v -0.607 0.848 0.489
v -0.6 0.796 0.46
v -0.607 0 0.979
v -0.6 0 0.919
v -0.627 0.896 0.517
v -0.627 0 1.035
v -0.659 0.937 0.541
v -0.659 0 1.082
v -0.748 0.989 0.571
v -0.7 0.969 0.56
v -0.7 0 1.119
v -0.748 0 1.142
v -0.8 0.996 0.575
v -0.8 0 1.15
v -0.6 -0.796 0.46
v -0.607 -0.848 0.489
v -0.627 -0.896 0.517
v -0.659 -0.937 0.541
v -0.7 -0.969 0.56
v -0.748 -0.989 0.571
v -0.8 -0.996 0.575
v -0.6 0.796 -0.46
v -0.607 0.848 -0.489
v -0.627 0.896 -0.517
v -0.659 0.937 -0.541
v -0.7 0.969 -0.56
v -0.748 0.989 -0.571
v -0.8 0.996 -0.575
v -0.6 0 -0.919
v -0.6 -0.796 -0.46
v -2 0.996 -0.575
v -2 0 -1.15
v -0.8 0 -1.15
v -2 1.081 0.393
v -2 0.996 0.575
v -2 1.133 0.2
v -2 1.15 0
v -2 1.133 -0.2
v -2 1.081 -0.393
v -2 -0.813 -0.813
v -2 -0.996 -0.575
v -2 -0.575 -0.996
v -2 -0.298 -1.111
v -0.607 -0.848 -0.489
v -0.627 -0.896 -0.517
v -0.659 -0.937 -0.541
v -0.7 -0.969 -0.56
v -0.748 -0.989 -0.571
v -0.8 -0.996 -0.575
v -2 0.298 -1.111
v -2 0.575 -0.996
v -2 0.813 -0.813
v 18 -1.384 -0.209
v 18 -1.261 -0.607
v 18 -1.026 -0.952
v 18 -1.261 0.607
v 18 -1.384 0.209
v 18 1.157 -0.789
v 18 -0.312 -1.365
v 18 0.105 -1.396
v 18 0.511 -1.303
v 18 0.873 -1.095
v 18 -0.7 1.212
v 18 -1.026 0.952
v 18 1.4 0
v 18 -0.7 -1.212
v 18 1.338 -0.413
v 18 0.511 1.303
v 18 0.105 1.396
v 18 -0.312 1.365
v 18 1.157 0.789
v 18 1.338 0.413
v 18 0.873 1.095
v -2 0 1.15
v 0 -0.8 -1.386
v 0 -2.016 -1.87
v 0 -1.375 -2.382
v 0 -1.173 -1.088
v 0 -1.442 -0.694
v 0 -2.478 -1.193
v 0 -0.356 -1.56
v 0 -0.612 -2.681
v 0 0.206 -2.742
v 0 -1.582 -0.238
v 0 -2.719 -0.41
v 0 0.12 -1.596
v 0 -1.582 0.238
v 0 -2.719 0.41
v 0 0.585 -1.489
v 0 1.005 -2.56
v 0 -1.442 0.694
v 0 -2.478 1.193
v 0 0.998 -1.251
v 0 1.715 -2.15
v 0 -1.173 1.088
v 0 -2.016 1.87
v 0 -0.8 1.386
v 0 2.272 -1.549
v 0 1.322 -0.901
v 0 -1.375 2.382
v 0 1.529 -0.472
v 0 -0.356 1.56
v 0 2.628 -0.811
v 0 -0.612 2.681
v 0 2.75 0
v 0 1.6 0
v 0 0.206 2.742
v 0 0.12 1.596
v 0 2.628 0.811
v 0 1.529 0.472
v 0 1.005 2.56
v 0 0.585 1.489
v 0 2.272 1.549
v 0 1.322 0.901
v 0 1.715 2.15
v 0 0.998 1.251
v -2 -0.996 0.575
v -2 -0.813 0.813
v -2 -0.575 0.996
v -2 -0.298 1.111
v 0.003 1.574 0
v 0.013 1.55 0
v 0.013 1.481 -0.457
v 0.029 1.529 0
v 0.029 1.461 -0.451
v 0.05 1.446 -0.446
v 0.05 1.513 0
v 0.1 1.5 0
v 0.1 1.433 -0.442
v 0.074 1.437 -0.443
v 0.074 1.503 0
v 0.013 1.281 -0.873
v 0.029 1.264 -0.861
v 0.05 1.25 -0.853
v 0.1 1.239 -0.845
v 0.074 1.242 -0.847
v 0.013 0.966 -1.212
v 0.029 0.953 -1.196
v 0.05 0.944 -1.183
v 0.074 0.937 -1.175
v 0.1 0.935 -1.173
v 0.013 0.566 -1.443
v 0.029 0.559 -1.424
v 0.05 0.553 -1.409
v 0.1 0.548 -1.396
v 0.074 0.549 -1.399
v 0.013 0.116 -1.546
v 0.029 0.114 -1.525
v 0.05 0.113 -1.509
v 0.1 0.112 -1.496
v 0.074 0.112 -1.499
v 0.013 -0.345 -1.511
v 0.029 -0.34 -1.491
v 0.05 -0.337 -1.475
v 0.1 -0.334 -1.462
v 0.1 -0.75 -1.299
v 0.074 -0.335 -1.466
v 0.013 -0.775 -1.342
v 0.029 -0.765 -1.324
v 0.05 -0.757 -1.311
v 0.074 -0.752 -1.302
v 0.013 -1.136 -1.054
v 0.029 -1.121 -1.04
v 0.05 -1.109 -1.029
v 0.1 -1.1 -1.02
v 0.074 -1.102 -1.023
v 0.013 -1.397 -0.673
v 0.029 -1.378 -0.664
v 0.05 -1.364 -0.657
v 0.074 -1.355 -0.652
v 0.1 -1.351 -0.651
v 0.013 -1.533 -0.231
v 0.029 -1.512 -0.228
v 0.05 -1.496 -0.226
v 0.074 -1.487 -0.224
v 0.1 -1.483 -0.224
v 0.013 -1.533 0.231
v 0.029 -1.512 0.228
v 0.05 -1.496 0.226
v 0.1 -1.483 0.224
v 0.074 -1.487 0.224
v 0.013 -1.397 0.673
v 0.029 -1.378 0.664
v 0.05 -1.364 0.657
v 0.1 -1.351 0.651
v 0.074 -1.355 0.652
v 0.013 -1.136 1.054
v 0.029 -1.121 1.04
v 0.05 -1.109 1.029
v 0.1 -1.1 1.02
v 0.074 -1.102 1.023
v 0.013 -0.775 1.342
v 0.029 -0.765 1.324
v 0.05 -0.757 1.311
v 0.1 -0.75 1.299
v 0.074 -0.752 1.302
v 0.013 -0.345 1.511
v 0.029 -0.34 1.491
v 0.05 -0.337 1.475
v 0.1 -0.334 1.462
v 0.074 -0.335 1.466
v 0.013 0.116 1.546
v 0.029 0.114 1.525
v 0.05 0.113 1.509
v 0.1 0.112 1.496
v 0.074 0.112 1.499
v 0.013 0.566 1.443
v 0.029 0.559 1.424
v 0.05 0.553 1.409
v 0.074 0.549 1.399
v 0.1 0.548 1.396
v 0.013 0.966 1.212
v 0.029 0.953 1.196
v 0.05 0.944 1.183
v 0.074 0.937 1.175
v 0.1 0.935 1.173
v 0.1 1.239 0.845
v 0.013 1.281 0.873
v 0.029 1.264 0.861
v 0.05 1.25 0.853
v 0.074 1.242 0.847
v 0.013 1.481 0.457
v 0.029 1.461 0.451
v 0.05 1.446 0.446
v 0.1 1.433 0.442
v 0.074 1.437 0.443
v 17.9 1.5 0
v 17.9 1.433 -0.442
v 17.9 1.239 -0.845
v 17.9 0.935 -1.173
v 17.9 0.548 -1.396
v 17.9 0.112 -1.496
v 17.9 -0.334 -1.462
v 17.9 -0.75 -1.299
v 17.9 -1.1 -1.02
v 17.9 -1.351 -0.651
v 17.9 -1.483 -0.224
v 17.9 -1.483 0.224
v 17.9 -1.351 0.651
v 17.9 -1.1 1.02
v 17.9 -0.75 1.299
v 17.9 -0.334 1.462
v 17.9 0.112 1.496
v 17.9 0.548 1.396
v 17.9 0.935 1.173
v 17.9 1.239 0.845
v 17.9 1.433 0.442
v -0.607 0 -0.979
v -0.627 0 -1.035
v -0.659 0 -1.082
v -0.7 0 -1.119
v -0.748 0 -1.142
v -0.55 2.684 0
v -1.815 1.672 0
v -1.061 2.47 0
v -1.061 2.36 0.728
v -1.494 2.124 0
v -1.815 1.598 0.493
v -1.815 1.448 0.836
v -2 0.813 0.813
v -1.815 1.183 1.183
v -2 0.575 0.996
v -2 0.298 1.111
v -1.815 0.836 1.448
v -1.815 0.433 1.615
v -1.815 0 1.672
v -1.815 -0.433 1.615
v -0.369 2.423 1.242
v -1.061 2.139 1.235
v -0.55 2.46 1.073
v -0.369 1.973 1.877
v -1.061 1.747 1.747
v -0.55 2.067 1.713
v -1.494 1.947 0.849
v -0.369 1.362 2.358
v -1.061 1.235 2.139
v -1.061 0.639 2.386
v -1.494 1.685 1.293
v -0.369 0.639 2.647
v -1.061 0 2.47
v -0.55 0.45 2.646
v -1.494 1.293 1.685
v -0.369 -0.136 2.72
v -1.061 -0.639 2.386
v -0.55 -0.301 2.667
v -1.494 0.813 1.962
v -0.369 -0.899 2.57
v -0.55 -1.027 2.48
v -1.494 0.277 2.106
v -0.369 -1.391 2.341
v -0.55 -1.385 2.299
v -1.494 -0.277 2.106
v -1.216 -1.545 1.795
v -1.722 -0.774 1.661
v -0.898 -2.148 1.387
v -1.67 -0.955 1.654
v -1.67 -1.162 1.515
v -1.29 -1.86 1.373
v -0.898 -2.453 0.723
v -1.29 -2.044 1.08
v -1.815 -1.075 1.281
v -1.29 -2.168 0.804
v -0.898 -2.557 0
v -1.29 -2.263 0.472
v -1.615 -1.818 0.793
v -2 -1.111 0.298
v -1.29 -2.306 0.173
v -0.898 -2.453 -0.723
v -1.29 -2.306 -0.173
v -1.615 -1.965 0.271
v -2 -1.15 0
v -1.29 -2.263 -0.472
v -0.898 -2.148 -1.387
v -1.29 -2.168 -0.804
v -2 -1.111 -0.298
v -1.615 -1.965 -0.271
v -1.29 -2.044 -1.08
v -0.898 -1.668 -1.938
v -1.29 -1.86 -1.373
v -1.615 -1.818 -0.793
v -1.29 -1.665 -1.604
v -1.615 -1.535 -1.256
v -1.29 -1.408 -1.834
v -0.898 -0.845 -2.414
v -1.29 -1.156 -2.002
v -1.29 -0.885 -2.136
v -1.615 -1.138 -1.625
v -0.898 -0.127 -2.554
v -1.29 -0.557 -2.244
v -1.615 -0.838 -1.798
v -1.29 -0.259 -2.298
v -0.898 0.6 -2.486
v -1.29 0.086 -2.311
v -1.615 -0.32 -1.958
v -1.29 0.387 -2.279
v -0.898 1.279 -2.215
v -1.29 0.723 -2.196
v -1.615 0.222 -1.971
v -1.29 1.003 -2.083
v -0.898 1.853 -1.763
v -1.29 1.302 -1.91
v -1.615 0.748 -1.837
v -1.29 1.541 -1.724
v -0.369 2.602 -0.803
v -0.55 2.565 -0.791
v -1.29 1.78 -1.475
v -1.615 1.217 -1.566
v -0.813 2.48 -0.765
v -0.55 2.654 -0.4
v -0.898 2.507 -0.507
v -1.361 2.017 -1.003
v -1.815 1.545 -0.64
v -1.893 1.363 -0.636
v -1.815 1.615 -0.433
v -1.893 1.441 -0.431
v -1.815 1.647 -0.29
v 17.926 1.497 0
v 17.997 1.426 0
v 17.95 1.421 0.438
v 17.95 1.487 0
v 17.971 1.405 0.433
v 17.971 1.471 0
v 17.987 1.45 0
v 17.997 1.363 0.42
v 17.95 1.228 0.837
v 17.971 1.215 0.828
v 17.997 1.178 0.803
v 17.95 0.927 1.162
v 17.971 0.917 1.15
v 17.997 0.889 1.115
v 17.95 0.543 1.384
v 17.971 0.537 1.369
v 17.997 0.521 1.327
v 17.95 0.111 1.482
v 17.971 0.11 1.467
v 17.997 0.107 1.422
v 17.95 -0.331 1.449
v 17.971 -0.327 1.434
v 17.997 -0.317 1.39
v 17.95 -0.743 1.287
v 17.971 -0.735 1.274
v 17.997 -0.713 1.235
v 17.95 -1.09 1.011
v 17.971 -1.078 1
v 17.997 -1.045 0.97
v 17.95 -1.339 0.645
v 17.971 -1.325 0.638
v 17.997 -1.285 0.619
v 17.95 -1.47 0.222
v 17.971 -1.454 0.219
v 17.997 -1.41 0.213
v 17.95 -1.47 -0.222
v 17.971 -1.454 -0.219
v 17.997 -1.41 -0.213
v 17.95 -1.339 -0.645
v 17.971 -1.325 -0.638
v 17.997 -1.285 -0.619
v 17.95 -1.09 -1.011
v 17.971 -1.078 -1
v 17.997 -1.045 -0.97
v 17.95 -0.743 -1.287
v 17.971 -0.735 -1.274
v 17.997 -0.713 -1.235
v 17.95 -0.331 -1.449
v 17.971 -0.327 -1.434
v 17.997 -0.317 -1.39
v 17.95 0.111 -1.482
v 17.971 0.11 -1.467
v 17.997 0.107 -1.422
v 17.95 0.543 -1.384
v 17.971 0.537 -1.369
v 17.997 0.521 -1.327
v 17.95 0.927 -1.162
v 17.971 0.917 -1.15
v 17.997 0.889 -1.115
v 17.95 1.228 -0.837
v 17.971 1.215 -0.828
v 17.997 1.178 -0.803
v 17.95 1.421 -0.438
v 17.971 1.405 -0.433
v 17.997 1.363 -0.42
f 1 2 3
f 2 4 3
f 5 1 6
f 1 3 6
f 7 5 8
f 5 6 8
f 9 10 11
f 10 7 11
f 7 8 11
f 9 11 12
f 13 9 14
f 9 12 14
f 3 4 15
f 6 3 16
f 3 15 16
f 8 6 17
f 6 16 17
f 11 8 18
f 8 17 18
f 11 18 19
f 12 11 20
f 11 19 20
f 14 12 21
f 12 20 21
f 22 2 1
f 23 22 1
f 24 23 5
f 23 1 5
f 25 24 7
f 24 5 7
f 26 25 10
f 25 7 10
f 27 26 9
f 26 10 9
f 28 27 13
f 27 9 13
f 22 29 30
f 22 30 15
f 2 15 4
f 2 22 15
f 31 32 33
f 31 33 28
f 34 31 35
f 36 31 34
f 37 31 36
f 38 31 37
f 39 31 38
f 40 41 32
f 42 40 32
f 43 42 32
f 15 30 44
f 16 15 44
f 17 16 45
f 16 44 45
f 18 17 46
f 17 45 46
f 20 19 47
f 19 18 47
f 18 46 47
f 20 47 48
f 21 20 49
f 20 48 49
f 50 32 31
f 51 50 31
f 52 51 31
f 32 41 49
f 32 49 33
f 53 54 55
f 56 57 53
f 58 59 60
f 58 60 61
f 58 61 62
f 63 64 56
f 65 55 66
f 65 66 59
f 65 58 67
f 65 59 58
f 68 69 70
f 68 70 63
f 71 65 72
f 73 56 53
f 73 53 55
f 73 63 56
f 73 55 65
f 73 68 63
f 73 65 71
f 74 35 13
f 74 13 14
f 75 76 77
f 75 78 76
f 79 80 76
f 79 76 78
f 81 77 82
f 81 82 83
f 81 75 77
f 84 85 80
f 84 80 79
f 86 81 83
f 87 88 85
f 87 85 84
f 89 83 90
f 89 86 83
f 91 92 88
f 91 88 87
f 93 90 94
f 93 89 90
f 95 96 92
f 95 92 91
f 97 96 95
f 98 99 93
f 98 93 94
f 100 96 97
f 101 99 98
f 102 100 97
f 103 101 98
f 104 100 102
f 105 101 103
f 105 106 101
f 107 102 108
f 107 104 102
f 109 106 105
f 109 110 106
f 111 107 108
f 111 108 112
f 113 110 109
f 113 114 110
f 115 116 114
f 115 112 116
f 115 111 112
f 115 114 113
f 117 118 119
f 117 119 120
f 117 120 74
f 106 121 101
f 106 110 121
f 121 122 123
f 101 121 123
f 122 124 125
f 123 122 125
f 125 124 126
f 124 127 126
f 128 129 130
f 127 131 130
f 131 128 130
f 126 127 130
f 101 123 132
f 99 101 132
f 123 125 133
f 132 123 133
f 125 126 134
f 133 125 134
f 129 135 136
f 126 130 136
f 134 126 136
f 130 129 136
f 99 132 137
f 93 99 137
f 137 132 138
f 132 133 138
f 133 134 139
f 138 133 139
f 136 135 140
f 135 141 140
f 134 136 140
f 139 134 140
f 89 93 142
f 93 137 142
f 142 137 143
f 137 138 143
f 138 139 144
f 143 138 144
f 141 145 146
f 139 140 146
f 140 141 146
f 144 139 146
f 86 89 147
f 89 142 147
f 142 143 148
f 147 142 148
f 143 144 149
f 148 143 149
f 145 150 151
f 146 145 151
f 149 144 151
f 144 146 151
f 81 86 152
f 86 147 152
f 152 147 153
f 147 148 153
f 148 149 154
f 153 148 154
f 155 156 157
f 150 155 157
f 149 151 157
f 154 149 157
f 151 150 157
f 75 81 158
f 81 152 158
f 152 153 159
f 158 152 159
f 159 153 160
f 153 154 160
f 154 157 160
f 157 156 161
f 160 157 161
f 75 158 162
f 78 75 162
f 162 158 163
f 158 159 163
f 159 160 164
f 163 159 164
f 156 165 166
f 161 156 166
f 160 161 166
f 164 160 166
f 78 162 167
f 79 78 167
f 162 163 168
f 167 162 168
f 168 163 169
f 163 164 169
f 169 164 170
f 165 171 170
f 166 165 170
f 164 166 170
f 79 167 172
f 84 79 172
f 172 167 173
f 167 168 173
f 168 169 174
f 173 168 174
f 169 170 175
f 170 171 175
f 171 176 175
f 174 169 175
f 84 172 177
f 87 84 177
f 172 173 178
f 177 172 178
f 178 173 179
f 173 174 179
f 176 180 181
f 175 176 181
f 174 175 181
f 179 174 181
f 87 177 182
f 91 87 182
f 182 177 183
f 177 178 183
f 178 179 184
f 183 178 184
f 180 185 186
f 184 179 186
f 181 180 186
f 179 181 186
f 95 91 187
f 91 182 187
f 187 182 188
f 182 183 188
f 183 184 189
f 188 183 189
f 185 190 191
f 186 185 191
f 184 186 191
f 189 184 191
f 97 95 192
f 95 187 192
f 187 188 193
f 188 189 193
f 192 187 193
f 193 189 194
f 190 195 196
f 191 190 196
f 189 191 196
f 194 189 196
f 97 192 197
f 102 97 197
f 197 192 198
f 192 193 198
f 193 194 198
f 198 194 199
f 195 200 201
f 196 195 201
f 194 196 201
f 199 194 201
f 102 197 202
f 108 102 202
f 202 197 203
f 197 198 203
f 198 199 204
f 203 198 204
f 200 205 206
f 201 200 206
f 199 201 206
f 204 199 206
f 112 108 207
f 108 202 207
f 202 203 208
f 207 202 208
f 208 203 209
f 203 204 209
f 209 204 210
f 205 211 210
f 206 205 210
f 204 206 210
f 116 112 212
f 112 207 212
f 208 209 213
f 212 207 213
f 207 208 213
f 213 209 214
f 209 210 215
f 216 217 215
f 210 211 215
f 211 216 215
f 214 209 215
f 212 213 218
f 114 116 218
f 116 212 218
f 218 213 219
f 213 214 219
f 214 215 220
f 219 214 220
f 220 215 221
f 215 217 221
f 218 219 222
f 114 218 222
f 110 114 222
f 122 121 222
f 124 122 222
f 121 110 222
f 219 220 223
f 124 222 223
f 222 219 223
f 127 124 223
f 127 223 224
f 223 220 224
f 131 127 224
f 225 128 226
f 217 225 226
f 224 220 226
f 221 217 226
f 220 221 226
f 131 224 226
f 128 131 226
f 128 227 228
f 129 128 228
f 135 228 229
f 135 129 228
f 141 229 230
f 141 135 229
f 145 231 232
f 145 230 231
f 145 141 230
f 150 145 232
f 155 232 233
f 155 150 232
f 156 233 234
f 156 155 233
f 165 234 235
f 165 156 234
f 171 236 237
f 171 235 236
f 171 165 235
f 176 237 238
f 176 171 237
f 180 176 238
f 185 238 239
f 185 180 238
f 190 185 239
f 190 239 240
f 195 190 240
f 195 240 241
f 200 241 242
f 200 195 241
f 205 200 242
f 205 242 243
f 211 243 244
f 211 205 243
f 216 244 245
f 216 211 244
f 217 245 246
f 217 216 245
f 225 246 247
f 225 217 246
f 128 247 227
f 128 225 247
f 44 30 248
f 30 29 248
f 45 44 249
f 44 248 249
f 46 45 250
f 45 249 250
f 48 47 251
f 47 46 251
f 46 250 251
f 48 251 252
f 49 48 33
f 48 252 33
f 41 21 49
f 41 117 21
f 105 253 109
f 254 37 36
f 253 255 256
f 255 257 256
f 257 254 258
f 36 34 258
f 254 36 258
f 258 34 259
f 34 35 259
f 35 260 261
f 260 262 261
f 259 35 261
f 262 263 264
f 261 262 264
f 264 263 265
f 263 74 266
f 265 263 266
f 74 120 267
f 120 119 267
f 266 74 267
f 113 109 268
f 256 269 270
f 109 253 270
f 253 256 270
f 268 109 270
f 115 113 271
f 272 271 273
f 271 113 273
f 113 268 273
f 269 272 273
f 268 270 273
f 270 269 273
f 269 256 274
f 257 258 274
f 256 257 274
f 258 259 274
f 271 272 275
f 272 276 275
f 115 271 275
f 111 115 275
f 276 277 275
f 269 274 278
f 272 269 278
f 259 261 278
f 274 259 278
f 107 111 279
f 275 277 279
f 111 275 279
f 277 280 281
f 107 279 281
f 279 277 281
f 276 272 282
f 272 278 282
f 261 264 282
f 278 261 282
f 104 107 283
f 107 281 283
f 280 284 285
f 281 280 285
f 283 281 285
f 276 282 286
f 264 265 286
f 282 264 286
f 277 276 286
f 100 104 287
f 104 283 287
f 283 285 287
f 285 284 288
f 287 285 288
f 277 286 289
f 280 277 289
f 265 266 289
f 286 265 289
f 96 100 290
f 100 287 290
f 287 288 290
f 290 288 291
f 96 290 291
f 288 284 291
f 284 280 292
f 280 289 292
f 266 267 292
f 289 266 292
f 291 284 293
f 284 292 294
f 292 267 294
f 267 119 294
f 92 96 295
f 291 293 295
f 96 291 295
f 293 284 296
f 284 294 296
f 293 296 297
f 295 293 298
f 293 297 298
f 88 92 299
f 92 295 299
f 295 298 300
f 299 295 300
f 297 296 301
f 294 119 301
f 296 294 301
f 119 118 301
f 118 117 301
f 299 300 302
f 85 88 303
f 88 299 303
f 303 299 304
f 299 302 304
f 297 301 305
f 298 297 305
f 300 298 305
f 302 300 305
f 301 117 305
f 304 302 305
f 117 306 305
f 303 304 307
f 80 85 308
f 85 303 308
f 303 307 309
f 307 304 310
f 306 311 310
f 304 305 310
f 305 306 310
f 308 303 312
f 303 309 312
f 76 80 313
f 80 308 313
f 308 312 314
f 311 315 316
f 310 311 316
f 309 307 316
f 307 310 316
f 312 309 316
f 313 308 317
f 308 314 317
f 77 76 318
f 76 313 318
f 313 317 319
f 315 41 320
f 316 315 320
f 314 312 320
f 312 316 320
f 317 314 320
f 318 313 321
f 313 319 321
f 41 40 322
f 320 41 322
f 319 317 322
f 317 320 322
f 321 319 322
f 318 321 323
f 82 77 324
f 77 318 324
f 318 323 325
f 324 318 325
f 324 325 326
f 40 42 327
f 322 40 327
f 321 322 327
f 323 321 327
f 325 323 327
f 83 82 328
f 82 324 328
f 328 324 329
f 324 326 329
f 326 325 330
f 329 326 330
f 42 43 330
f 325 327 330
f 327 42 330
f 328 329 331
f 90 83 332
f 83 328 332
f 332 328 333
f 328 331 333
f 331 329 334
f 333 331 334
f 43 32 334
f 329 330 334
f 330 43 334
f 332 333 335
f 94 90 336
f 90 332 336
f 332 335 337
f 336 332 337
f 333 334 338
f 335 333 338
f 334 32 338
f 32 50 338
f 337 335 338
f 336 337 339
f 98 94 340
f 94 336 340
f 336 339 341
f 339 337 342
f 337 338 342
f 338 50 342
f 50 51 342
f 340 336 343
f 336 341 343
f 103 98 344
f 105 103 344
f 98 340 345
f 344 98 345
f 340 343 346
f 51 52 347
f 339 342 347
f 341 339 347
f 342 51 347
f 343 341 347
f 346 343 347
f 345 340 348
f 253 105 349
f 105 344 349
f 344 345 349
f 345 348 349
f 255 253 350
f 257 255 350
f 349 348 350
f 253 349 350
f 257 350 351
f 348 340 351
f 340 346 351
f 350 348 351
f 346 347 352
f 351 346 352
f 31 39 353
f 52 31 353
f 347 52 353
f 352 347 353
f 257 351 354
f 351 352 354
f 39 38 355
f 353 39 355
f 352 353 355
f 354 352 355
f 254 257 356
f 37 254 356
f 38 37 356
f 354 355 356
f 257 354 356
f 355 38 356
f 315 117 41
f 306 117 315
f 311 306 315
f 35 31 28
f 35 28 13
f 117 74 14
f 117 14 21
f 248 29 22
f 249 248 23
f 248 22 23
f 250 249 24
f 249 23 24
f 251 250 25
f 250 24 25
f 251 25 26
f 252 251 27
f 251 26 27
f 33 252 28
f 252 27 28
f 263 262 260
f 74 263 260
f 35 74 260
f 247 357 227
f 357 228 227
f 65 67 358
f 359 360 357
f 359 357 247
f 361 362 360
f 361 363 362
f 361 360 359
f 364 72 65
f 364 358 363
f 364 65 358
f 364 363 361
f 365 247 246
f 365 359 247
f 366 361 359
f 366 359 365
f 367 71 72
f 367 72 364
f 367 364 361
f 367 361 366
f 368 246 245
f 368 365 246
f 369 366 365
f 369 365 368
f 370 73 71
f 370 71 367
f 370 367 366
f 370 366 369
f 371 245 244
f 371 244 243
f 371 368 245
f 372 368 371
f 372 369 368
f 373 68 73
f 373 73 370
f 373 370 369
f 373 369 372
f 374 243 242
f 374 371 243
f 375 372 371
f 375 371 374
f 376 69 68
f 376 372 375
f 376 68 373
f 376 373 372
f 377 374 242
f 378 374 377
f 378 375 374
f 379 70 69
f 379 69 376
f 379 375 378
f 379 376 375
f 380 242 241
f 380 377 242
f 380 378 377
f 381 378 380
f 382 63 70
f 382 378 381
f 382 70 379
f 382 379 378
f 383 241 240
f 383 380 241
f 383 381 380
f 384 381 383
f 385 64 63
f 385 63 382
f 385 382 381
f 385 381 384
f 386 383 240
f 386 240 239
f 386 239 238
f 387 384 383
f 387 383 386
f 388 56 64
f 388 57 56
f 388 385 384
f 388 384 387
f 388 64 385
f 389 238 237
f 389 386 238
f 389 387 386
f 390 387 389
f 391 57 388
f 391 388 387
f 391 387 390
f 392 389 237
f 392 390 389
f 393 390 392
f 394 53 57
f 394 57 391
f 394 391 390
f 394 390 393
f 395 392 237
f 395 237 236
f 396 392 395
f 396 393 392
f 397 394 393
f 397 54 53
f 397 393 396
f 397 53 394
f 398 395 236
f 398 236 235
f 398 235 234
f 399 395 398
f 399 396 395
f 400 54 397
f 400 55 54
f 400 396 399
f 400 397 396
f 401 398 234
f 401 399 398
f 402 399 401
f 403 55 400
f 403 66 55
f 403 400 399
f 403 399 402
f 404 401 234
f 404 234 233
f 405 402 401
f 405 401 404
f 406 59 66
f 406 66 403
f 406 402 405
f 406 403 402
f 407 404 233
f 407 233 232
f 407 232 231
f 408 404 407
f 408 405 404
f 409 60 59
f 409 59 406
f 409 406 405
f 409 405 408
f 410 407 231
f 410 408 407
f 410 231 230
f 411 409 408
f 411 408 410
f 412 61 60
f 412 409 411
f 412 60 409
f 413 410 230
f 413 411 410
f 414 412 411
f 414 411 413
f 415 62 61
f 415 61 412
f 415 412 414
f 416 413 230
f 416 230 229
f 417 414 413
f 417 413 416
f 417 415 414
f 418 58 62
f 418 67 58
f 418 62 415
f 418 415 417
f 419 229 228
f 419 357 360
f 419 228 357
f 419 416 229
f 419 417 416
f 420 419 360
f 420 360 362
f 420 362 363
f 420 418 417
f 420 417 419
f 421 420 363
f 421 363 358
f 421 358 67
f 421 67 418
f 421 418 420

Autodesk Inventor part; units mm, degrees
ref_plane "YZ Plane" through (0, 0, 0) normal (1, 0, 0) x (0, 1, 0)
ref_plane "XZ Plane" through (0, 0, 0) normal (0, 1, 0) x (-1, 0, 0)
ref_plane "XY Plane" through (0, 0, 0) normal (0, 0, 1) x (1, 0, 0)
sketch "スケッチ1" plane through (0, 0, 0) normal (0, 0, 1) x (1, 0, 0)
  line L0 (0, 0) -> (18, 0)
  line L1 (18, 0) -> (18, 1.5)
  line L2 (18, 1.5) -> (0, 1.5)
  line L3 (0, 1.5) -> (0, 0)
  line L4 (0, 0) -> (0, 2.75)
  line L5 (0, 0) -> (-2, 0)
  line L6 (-2, 0) -> (0, 0)
  line L7 (-2, 0) -> (-2, 1.15)
  arc A0 (0, 2.75) -> (-2, 1.15) centre (-0.0403, 0.7504) ccw
  dimension "d0" = 1.5
  dimension "d1" = 18
  dimension "d3" = 2
  dimension "d4" = 2.75
  dimension "d5" = 1.15
  dimension "d6" = 2
revolve "回転1" add sketch "スケッチ1" angle 360 about axis through (-2, 0, 0) along (1, 0, 0)
thread "ねじ1" size "M3x0.5" class "6g" standard "ANSI Metric M Profile" length 100
sketch "スケッチ2" plane through (-2, 0, 0) normal (-1, 0, 0) x (0, 0, 1)
  circle A0 centre (0, 0) radius 1.15 projected
  line L0 (-0.575, 0.9959) -> (0.575, 0.9959)
  line L1 (0.575, 0.9959) -> (1.15, 0)
  line L2 (1.15, 0) -> (0.575, -0.9959)
  line L3 (0.575, -0.9959) -> (-0.575, -0.9959)
  line L4 (-0.575, -0.9959) -> (-1.15, 0)
  line L5 (-1.15, 0) -> (-0.575, 0.9959)
  dimension "d10" = 1.15
  dimension "d11" = 1.9919
extrude "押し出し1" cut sketch "スケッチ2" against normal blind 1.4 contours L2 L3 L4 L5 L0 L1
fillet "フィレット1" radius 0.2 6 edges at (-0.6, 0.9959, 0) (-0.6, 0.498, 0.8625) (-0.6, 0.498, -0.8625) (-0.6, -0.498, -0.8625) (-0.6, -0.9959, 0) (-0.6, -0.498, 0.8625)
fillet "フィレット2" radius 0.1 1 edges at (0, -1.5, 0)
fillet "フィレット3" radius 0.1 1 edges at (18, -1.5, 0)
properties part number "ネジボタンM3L18" material "鋼"
